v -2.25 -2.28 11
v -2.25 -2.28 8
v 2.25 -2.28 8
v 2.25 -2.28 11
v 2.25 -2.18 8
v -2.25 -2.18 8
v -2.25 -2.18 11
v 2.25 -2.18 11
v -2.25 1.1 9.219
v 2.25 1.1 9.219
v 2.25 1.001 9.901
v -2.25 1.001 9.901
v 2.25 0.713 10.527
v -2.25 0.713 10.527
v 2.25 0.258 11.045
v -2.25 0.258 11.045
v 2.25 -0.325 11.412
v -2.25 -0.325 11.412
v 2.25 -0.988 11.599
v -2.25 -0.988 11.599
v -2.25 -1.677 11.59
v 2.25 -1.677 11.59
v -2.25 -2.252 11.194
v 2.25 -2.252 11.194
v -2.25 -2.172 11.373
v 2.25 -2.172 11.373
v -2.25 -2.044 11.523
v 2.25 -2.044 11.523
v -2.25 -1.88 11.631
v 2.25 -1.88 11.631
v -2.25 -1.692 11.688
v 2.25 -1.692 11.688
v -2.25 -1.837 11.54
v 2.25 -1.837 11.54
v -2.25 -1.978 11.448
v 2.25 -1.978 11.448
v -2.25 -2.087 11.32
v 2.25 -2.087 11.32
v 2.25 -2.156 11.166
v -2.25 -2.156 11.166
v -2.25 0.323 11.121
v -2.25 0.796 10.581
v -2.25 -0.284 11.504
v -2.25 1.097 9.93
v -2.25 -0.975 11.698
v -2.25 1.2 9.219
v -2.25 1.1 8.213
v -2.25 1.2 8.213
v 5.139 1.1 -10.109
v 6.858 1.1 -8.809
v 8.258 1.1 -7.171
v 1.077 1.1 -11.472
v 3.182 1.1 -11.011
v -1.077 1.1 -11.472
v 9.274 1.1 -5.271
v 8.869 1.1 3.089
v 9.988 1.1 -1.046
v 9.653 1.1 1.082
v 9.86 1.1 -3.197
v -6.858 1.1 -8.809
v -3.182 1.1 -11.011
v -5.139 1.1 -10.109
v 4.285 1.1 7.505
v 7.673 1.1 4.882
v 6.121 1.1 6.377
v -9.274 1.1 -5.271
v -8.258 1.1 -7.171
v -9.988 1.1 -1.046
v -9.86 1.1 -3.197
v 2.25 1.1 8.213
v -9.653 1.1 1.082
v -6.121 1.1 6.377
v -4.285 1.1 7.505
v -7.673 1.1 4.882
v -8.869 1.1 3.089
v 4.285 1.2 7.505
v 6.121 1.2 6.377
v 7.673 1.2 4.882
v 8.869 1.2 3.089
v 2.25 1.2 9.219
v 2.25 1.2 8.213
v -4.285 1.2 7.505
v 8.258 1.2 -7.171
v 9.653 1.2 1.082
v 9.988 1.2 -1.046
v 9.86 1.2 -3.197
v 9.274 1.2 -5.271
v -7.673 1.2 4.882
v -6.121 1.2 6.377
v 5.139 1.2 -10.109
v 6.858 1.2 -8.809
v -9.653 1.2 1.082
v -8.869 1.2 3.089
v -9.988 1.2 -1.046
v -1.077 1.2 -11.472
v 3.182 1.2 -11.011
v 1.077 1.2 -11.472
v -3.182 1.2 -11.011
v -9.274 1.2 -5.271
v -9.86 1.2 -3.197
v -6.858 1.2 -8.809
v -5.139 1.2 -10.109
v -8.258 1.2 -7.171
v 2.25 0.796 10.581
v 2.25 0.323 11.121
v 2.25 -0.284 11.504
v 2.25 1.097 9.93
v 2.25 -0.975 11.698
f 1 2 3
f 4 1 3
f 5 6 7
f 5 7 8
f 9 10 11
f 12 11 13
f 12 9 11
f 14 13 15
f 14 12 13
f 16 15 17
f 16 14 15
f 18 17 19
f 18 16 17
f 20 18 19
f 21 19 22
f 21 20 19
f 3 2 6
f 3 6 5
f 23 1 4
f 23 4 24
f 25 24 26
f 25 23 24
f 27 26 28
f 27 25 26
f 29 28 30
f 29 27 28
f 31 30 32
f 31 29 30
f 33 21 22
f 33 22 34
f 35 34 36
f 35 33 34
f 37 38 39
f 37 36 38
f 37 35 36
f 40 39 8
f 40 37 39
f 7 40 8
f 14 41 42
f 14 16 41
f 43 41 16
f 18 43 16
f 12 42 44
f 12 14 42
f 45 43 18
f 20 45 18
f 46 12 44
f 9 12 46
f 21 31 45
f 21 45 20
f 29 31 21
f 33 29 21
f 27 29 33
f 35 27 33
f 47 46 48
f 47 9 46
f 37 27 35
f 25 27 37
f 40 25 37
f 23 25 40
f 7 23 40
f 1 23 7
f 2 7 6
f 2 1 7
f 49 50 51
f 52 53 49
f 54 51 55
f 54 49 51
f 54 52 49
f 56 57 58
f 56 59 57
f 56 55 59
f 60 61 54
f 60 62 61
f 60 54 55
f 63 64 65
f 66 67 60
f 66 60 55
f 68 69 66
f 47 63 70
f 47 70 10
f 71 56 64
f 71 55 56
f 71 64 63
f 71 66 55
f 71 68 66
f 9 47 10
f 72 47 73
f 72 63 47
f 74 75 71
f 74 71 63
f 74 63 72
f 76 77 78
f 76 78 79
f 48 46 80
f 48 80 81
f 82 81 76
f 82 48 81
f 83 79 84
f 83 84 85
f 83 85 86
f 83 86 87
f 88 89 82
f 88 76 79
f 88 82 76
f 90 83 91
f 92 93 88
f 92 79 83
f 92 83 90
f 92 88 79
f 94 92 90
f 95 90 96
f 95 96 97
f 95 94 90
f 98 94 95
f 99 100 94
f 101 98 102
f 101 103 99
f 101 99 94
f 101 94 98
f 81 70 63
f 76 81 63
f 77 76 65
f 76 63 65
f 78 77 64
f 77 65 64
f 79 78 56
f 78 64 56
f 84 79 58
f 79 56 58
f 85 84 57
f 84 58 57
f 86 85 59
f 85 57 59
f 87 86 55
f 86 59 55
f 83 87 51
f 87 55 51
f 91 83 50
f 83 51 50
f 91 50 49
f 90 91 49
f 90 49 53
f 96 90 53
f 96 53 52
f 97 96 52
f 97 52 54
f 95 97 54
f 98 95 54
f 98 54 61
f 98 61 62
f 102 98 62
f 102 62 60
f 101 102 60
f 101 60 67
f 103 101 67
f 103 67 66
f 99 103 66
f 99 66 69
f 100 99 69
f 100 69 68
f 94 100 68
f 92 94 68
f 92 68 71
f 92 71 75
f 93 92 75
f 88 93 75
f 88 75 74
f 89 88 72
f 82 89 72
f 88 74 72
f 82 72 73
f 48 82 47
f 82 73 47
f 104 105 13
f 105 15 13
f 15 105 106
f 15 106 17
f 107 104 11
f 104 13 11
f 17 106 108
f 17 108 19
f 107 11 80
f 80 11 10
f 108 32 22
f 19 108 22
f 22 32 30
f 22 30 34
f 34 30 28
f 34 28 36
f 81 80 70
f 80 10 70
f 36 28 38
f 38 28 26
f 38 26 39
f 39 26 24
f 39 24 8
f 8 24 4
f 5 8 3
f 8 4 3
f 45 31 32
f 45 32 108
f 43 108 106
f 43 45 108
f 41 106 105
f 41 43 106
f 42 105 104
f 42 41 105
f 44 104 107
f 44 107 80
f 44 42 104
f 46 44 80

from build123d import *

# Parameters (mm, degrees)
SKETCH1_R                       = 10
BOSS_EXTRUDE1_DEPTH             = 0.1
BOSS_EXTRUDE2_START             = -2.28
SKETCH3_W                       = 4.5
SKETCH3_H                       = 2.5
BOSS_EXTRUDE2_DEPTH             = 0.1
EXTRUDE_THIN1_REACH             = 17.432
EXTRUDE_THIN1_DIRECTION_2_REACH = 17.432


with BuildPart() as part:
    # Sketch1 → Boss-Extrude1 (new body)
    with BuildSketch(Plane(origin=(0, 1.1, 0), x_dir=(1, 0, 0), z_dir=(0, 1, 0))):
        with Locations(Location((0, 1.53064501, 0), (0, 0, 270))):
            Circle(SKETCH1_R)
    extrude(amount=BOSS_EXTRUDE1_DEPTH)


with BuildPart() as body_2:
    # Sketch3 → Boss-Extrude2 (new body)
    with BuildSketch(Plane(origin=(0, 0, 0), x_dir=(1, 0, 0), z_dir=(0, 1, 0)).offset(BOSS_EXTRUDE2_START)):
        with Locations((0, -9.25)):
            Rectangle(SKETCH3_W, SKETCH3_H)
    extrude(amount=BOSS_EXTRUDE2_DEPTH)

    # Extrude-Thin1: up to this face of the body (flat: up to its plane)
    extrude_thin1_end = Plane(body_2.part.faces().sort_by_distance((2.25, -2.23, 9.25))[0])
    # Sketch4 → Extrude-Thin1 (add, up to the picked face)
    with BuildSketch(Plane(origin=(0, 0, 0), x_dir=(0, 0, -1), z_dir=(1, 0, 0)), mode=Mode.PRIVATE) as extrude_thin1_sk1:
        with BuildLine():
            Line((-9.5, -2.28), (-10.5, -2.28))
            Line((-10.5, -2.28), (-11, -2.28))
            ThreePointArc((-11, -2.28), (-11.452530048, -2.113120853), (-11.688368572, -1.692392575))
            ThreePointArc((-11.688368572, -1.692392575), (-11.120799367, 0.32311715), (-9.21935499, 1.2))
            Line((-9.21935499, 1.2), (-8.46935499, 1.2))
            Line((-8.46935499, 1.2), (-5, 1.2))
            Line((-5, 1.2), (-5, 1.1))
            Line((-5, 1.1), (-8.46935499, 1.1))
            Line((-8.46935499, 1.1), (-9.21935499, 1.1))
            ThreePointArc((-9.21935499, 1.1), (-11.044741592, 0.258192464), (-11.589608029, -1.676696872))
            ThreePointArc((-11.589608029, -1.676696872), (-11.387605362, -2.037063078), (-11, -2.18))
            Line((-11, -2.18), (-10.5, -2.18))
            Line((-10.5, -2.18), (-9.5, -2.18))
            Line((-9.5, -2.18), (-9.5, -2.28))
        make_face()
    extrude_thin1_tool1 = split(extrude(extrude_thin1_sk1.sketch, amount=EXTRUDE_THIN1_REACH, mode=Mode.PRIVATE), bisect_by=extrude_thin1_end, keep=Keep.BOTH, mode=Mode.PRIVATE)

    add(part.part)  # Extrude-Thin1 merges part
    add(extrude_thin1_tool1.solids().sort_by(Axis((0, -2.25567, 10.75), (1, 0, 0)))[0])

    # Extrude-Thin1 direction 2: up to this face of the body (flat: up to its plane)
    extrude_thin1_direction_2_end = Plane(body_2.part.faces().sort_by_distance((-2.25, -2.23, 9.25))[0])
    # Sketch4 → Extrude-Thin1 direction 2 (add, up to the picked face)
    with BuildSketch(Plane(origin=(0, 0, 0), x_dir=(0, 0, -1), z_dir=(1, 0, 0)), mode=Mode.PRIVATE) as extrude_thin1_direction_2_sk1:
        with BuildLine():
            Line((-9.5, -2.28), (-10.5, -2.28))
            Line((-10.5, -2.28), (-11, -2.28))
            ThreePointArc((-11, -2.28), (-11.452530048, -2.113120853), (-11.688368572, -1.692392575))
            ThreePointArc((-11.688368572, -1.692392575), (-11.120799367, 0.32311715), (-9.21935499, 1.2))
            Line((-9.21935499, 1.2), (-8.46935499, 1.2))
            Line((-8.46935499, 1.2), (-5, 1.2))
            Line((-5, 1.2), (-5, 1.1))
            Line((-5, 1.1), (-8.46935499, 1.1))
            Line((-8.46935499, 1.1), (-9.21935499, 1.1))
            ThreePointArc((-9.21935499, 1.1), (-11.044741592, 0.258192464), (-11.589608029, -1.676696872))
            ThreePointArc((-11.589608029, -1.676696872), (-11.387605362, -2.037063078), (-11, -2.18))
            Line((-11, -2.18), (-10.5, -2.18))
            Line((-10.5, -2.18), (-9.5, -2.18))
            Line((-9.5, -2.18), (-9.5, -2.28))
        make_face()
    extrude_thin1_direction_2_tool1 = split(extrude(extrude_thin1_direction_2_sk1.sketch, amount=-EXTRUDE_THIN1_DIRECTION_2_REACH, mode=Mode.PRIVATE), bisect_by=extrude_thin1_direction_2_end, keep=Keep.BOTH, mode=Mode.PRIVATE)
    add(extrude_thin1_direction_2_tool1.solids().sort_by(Axis((0, -2.25567, 10.75), (-1, 0, 0)))[0])


solid = body_2.part
